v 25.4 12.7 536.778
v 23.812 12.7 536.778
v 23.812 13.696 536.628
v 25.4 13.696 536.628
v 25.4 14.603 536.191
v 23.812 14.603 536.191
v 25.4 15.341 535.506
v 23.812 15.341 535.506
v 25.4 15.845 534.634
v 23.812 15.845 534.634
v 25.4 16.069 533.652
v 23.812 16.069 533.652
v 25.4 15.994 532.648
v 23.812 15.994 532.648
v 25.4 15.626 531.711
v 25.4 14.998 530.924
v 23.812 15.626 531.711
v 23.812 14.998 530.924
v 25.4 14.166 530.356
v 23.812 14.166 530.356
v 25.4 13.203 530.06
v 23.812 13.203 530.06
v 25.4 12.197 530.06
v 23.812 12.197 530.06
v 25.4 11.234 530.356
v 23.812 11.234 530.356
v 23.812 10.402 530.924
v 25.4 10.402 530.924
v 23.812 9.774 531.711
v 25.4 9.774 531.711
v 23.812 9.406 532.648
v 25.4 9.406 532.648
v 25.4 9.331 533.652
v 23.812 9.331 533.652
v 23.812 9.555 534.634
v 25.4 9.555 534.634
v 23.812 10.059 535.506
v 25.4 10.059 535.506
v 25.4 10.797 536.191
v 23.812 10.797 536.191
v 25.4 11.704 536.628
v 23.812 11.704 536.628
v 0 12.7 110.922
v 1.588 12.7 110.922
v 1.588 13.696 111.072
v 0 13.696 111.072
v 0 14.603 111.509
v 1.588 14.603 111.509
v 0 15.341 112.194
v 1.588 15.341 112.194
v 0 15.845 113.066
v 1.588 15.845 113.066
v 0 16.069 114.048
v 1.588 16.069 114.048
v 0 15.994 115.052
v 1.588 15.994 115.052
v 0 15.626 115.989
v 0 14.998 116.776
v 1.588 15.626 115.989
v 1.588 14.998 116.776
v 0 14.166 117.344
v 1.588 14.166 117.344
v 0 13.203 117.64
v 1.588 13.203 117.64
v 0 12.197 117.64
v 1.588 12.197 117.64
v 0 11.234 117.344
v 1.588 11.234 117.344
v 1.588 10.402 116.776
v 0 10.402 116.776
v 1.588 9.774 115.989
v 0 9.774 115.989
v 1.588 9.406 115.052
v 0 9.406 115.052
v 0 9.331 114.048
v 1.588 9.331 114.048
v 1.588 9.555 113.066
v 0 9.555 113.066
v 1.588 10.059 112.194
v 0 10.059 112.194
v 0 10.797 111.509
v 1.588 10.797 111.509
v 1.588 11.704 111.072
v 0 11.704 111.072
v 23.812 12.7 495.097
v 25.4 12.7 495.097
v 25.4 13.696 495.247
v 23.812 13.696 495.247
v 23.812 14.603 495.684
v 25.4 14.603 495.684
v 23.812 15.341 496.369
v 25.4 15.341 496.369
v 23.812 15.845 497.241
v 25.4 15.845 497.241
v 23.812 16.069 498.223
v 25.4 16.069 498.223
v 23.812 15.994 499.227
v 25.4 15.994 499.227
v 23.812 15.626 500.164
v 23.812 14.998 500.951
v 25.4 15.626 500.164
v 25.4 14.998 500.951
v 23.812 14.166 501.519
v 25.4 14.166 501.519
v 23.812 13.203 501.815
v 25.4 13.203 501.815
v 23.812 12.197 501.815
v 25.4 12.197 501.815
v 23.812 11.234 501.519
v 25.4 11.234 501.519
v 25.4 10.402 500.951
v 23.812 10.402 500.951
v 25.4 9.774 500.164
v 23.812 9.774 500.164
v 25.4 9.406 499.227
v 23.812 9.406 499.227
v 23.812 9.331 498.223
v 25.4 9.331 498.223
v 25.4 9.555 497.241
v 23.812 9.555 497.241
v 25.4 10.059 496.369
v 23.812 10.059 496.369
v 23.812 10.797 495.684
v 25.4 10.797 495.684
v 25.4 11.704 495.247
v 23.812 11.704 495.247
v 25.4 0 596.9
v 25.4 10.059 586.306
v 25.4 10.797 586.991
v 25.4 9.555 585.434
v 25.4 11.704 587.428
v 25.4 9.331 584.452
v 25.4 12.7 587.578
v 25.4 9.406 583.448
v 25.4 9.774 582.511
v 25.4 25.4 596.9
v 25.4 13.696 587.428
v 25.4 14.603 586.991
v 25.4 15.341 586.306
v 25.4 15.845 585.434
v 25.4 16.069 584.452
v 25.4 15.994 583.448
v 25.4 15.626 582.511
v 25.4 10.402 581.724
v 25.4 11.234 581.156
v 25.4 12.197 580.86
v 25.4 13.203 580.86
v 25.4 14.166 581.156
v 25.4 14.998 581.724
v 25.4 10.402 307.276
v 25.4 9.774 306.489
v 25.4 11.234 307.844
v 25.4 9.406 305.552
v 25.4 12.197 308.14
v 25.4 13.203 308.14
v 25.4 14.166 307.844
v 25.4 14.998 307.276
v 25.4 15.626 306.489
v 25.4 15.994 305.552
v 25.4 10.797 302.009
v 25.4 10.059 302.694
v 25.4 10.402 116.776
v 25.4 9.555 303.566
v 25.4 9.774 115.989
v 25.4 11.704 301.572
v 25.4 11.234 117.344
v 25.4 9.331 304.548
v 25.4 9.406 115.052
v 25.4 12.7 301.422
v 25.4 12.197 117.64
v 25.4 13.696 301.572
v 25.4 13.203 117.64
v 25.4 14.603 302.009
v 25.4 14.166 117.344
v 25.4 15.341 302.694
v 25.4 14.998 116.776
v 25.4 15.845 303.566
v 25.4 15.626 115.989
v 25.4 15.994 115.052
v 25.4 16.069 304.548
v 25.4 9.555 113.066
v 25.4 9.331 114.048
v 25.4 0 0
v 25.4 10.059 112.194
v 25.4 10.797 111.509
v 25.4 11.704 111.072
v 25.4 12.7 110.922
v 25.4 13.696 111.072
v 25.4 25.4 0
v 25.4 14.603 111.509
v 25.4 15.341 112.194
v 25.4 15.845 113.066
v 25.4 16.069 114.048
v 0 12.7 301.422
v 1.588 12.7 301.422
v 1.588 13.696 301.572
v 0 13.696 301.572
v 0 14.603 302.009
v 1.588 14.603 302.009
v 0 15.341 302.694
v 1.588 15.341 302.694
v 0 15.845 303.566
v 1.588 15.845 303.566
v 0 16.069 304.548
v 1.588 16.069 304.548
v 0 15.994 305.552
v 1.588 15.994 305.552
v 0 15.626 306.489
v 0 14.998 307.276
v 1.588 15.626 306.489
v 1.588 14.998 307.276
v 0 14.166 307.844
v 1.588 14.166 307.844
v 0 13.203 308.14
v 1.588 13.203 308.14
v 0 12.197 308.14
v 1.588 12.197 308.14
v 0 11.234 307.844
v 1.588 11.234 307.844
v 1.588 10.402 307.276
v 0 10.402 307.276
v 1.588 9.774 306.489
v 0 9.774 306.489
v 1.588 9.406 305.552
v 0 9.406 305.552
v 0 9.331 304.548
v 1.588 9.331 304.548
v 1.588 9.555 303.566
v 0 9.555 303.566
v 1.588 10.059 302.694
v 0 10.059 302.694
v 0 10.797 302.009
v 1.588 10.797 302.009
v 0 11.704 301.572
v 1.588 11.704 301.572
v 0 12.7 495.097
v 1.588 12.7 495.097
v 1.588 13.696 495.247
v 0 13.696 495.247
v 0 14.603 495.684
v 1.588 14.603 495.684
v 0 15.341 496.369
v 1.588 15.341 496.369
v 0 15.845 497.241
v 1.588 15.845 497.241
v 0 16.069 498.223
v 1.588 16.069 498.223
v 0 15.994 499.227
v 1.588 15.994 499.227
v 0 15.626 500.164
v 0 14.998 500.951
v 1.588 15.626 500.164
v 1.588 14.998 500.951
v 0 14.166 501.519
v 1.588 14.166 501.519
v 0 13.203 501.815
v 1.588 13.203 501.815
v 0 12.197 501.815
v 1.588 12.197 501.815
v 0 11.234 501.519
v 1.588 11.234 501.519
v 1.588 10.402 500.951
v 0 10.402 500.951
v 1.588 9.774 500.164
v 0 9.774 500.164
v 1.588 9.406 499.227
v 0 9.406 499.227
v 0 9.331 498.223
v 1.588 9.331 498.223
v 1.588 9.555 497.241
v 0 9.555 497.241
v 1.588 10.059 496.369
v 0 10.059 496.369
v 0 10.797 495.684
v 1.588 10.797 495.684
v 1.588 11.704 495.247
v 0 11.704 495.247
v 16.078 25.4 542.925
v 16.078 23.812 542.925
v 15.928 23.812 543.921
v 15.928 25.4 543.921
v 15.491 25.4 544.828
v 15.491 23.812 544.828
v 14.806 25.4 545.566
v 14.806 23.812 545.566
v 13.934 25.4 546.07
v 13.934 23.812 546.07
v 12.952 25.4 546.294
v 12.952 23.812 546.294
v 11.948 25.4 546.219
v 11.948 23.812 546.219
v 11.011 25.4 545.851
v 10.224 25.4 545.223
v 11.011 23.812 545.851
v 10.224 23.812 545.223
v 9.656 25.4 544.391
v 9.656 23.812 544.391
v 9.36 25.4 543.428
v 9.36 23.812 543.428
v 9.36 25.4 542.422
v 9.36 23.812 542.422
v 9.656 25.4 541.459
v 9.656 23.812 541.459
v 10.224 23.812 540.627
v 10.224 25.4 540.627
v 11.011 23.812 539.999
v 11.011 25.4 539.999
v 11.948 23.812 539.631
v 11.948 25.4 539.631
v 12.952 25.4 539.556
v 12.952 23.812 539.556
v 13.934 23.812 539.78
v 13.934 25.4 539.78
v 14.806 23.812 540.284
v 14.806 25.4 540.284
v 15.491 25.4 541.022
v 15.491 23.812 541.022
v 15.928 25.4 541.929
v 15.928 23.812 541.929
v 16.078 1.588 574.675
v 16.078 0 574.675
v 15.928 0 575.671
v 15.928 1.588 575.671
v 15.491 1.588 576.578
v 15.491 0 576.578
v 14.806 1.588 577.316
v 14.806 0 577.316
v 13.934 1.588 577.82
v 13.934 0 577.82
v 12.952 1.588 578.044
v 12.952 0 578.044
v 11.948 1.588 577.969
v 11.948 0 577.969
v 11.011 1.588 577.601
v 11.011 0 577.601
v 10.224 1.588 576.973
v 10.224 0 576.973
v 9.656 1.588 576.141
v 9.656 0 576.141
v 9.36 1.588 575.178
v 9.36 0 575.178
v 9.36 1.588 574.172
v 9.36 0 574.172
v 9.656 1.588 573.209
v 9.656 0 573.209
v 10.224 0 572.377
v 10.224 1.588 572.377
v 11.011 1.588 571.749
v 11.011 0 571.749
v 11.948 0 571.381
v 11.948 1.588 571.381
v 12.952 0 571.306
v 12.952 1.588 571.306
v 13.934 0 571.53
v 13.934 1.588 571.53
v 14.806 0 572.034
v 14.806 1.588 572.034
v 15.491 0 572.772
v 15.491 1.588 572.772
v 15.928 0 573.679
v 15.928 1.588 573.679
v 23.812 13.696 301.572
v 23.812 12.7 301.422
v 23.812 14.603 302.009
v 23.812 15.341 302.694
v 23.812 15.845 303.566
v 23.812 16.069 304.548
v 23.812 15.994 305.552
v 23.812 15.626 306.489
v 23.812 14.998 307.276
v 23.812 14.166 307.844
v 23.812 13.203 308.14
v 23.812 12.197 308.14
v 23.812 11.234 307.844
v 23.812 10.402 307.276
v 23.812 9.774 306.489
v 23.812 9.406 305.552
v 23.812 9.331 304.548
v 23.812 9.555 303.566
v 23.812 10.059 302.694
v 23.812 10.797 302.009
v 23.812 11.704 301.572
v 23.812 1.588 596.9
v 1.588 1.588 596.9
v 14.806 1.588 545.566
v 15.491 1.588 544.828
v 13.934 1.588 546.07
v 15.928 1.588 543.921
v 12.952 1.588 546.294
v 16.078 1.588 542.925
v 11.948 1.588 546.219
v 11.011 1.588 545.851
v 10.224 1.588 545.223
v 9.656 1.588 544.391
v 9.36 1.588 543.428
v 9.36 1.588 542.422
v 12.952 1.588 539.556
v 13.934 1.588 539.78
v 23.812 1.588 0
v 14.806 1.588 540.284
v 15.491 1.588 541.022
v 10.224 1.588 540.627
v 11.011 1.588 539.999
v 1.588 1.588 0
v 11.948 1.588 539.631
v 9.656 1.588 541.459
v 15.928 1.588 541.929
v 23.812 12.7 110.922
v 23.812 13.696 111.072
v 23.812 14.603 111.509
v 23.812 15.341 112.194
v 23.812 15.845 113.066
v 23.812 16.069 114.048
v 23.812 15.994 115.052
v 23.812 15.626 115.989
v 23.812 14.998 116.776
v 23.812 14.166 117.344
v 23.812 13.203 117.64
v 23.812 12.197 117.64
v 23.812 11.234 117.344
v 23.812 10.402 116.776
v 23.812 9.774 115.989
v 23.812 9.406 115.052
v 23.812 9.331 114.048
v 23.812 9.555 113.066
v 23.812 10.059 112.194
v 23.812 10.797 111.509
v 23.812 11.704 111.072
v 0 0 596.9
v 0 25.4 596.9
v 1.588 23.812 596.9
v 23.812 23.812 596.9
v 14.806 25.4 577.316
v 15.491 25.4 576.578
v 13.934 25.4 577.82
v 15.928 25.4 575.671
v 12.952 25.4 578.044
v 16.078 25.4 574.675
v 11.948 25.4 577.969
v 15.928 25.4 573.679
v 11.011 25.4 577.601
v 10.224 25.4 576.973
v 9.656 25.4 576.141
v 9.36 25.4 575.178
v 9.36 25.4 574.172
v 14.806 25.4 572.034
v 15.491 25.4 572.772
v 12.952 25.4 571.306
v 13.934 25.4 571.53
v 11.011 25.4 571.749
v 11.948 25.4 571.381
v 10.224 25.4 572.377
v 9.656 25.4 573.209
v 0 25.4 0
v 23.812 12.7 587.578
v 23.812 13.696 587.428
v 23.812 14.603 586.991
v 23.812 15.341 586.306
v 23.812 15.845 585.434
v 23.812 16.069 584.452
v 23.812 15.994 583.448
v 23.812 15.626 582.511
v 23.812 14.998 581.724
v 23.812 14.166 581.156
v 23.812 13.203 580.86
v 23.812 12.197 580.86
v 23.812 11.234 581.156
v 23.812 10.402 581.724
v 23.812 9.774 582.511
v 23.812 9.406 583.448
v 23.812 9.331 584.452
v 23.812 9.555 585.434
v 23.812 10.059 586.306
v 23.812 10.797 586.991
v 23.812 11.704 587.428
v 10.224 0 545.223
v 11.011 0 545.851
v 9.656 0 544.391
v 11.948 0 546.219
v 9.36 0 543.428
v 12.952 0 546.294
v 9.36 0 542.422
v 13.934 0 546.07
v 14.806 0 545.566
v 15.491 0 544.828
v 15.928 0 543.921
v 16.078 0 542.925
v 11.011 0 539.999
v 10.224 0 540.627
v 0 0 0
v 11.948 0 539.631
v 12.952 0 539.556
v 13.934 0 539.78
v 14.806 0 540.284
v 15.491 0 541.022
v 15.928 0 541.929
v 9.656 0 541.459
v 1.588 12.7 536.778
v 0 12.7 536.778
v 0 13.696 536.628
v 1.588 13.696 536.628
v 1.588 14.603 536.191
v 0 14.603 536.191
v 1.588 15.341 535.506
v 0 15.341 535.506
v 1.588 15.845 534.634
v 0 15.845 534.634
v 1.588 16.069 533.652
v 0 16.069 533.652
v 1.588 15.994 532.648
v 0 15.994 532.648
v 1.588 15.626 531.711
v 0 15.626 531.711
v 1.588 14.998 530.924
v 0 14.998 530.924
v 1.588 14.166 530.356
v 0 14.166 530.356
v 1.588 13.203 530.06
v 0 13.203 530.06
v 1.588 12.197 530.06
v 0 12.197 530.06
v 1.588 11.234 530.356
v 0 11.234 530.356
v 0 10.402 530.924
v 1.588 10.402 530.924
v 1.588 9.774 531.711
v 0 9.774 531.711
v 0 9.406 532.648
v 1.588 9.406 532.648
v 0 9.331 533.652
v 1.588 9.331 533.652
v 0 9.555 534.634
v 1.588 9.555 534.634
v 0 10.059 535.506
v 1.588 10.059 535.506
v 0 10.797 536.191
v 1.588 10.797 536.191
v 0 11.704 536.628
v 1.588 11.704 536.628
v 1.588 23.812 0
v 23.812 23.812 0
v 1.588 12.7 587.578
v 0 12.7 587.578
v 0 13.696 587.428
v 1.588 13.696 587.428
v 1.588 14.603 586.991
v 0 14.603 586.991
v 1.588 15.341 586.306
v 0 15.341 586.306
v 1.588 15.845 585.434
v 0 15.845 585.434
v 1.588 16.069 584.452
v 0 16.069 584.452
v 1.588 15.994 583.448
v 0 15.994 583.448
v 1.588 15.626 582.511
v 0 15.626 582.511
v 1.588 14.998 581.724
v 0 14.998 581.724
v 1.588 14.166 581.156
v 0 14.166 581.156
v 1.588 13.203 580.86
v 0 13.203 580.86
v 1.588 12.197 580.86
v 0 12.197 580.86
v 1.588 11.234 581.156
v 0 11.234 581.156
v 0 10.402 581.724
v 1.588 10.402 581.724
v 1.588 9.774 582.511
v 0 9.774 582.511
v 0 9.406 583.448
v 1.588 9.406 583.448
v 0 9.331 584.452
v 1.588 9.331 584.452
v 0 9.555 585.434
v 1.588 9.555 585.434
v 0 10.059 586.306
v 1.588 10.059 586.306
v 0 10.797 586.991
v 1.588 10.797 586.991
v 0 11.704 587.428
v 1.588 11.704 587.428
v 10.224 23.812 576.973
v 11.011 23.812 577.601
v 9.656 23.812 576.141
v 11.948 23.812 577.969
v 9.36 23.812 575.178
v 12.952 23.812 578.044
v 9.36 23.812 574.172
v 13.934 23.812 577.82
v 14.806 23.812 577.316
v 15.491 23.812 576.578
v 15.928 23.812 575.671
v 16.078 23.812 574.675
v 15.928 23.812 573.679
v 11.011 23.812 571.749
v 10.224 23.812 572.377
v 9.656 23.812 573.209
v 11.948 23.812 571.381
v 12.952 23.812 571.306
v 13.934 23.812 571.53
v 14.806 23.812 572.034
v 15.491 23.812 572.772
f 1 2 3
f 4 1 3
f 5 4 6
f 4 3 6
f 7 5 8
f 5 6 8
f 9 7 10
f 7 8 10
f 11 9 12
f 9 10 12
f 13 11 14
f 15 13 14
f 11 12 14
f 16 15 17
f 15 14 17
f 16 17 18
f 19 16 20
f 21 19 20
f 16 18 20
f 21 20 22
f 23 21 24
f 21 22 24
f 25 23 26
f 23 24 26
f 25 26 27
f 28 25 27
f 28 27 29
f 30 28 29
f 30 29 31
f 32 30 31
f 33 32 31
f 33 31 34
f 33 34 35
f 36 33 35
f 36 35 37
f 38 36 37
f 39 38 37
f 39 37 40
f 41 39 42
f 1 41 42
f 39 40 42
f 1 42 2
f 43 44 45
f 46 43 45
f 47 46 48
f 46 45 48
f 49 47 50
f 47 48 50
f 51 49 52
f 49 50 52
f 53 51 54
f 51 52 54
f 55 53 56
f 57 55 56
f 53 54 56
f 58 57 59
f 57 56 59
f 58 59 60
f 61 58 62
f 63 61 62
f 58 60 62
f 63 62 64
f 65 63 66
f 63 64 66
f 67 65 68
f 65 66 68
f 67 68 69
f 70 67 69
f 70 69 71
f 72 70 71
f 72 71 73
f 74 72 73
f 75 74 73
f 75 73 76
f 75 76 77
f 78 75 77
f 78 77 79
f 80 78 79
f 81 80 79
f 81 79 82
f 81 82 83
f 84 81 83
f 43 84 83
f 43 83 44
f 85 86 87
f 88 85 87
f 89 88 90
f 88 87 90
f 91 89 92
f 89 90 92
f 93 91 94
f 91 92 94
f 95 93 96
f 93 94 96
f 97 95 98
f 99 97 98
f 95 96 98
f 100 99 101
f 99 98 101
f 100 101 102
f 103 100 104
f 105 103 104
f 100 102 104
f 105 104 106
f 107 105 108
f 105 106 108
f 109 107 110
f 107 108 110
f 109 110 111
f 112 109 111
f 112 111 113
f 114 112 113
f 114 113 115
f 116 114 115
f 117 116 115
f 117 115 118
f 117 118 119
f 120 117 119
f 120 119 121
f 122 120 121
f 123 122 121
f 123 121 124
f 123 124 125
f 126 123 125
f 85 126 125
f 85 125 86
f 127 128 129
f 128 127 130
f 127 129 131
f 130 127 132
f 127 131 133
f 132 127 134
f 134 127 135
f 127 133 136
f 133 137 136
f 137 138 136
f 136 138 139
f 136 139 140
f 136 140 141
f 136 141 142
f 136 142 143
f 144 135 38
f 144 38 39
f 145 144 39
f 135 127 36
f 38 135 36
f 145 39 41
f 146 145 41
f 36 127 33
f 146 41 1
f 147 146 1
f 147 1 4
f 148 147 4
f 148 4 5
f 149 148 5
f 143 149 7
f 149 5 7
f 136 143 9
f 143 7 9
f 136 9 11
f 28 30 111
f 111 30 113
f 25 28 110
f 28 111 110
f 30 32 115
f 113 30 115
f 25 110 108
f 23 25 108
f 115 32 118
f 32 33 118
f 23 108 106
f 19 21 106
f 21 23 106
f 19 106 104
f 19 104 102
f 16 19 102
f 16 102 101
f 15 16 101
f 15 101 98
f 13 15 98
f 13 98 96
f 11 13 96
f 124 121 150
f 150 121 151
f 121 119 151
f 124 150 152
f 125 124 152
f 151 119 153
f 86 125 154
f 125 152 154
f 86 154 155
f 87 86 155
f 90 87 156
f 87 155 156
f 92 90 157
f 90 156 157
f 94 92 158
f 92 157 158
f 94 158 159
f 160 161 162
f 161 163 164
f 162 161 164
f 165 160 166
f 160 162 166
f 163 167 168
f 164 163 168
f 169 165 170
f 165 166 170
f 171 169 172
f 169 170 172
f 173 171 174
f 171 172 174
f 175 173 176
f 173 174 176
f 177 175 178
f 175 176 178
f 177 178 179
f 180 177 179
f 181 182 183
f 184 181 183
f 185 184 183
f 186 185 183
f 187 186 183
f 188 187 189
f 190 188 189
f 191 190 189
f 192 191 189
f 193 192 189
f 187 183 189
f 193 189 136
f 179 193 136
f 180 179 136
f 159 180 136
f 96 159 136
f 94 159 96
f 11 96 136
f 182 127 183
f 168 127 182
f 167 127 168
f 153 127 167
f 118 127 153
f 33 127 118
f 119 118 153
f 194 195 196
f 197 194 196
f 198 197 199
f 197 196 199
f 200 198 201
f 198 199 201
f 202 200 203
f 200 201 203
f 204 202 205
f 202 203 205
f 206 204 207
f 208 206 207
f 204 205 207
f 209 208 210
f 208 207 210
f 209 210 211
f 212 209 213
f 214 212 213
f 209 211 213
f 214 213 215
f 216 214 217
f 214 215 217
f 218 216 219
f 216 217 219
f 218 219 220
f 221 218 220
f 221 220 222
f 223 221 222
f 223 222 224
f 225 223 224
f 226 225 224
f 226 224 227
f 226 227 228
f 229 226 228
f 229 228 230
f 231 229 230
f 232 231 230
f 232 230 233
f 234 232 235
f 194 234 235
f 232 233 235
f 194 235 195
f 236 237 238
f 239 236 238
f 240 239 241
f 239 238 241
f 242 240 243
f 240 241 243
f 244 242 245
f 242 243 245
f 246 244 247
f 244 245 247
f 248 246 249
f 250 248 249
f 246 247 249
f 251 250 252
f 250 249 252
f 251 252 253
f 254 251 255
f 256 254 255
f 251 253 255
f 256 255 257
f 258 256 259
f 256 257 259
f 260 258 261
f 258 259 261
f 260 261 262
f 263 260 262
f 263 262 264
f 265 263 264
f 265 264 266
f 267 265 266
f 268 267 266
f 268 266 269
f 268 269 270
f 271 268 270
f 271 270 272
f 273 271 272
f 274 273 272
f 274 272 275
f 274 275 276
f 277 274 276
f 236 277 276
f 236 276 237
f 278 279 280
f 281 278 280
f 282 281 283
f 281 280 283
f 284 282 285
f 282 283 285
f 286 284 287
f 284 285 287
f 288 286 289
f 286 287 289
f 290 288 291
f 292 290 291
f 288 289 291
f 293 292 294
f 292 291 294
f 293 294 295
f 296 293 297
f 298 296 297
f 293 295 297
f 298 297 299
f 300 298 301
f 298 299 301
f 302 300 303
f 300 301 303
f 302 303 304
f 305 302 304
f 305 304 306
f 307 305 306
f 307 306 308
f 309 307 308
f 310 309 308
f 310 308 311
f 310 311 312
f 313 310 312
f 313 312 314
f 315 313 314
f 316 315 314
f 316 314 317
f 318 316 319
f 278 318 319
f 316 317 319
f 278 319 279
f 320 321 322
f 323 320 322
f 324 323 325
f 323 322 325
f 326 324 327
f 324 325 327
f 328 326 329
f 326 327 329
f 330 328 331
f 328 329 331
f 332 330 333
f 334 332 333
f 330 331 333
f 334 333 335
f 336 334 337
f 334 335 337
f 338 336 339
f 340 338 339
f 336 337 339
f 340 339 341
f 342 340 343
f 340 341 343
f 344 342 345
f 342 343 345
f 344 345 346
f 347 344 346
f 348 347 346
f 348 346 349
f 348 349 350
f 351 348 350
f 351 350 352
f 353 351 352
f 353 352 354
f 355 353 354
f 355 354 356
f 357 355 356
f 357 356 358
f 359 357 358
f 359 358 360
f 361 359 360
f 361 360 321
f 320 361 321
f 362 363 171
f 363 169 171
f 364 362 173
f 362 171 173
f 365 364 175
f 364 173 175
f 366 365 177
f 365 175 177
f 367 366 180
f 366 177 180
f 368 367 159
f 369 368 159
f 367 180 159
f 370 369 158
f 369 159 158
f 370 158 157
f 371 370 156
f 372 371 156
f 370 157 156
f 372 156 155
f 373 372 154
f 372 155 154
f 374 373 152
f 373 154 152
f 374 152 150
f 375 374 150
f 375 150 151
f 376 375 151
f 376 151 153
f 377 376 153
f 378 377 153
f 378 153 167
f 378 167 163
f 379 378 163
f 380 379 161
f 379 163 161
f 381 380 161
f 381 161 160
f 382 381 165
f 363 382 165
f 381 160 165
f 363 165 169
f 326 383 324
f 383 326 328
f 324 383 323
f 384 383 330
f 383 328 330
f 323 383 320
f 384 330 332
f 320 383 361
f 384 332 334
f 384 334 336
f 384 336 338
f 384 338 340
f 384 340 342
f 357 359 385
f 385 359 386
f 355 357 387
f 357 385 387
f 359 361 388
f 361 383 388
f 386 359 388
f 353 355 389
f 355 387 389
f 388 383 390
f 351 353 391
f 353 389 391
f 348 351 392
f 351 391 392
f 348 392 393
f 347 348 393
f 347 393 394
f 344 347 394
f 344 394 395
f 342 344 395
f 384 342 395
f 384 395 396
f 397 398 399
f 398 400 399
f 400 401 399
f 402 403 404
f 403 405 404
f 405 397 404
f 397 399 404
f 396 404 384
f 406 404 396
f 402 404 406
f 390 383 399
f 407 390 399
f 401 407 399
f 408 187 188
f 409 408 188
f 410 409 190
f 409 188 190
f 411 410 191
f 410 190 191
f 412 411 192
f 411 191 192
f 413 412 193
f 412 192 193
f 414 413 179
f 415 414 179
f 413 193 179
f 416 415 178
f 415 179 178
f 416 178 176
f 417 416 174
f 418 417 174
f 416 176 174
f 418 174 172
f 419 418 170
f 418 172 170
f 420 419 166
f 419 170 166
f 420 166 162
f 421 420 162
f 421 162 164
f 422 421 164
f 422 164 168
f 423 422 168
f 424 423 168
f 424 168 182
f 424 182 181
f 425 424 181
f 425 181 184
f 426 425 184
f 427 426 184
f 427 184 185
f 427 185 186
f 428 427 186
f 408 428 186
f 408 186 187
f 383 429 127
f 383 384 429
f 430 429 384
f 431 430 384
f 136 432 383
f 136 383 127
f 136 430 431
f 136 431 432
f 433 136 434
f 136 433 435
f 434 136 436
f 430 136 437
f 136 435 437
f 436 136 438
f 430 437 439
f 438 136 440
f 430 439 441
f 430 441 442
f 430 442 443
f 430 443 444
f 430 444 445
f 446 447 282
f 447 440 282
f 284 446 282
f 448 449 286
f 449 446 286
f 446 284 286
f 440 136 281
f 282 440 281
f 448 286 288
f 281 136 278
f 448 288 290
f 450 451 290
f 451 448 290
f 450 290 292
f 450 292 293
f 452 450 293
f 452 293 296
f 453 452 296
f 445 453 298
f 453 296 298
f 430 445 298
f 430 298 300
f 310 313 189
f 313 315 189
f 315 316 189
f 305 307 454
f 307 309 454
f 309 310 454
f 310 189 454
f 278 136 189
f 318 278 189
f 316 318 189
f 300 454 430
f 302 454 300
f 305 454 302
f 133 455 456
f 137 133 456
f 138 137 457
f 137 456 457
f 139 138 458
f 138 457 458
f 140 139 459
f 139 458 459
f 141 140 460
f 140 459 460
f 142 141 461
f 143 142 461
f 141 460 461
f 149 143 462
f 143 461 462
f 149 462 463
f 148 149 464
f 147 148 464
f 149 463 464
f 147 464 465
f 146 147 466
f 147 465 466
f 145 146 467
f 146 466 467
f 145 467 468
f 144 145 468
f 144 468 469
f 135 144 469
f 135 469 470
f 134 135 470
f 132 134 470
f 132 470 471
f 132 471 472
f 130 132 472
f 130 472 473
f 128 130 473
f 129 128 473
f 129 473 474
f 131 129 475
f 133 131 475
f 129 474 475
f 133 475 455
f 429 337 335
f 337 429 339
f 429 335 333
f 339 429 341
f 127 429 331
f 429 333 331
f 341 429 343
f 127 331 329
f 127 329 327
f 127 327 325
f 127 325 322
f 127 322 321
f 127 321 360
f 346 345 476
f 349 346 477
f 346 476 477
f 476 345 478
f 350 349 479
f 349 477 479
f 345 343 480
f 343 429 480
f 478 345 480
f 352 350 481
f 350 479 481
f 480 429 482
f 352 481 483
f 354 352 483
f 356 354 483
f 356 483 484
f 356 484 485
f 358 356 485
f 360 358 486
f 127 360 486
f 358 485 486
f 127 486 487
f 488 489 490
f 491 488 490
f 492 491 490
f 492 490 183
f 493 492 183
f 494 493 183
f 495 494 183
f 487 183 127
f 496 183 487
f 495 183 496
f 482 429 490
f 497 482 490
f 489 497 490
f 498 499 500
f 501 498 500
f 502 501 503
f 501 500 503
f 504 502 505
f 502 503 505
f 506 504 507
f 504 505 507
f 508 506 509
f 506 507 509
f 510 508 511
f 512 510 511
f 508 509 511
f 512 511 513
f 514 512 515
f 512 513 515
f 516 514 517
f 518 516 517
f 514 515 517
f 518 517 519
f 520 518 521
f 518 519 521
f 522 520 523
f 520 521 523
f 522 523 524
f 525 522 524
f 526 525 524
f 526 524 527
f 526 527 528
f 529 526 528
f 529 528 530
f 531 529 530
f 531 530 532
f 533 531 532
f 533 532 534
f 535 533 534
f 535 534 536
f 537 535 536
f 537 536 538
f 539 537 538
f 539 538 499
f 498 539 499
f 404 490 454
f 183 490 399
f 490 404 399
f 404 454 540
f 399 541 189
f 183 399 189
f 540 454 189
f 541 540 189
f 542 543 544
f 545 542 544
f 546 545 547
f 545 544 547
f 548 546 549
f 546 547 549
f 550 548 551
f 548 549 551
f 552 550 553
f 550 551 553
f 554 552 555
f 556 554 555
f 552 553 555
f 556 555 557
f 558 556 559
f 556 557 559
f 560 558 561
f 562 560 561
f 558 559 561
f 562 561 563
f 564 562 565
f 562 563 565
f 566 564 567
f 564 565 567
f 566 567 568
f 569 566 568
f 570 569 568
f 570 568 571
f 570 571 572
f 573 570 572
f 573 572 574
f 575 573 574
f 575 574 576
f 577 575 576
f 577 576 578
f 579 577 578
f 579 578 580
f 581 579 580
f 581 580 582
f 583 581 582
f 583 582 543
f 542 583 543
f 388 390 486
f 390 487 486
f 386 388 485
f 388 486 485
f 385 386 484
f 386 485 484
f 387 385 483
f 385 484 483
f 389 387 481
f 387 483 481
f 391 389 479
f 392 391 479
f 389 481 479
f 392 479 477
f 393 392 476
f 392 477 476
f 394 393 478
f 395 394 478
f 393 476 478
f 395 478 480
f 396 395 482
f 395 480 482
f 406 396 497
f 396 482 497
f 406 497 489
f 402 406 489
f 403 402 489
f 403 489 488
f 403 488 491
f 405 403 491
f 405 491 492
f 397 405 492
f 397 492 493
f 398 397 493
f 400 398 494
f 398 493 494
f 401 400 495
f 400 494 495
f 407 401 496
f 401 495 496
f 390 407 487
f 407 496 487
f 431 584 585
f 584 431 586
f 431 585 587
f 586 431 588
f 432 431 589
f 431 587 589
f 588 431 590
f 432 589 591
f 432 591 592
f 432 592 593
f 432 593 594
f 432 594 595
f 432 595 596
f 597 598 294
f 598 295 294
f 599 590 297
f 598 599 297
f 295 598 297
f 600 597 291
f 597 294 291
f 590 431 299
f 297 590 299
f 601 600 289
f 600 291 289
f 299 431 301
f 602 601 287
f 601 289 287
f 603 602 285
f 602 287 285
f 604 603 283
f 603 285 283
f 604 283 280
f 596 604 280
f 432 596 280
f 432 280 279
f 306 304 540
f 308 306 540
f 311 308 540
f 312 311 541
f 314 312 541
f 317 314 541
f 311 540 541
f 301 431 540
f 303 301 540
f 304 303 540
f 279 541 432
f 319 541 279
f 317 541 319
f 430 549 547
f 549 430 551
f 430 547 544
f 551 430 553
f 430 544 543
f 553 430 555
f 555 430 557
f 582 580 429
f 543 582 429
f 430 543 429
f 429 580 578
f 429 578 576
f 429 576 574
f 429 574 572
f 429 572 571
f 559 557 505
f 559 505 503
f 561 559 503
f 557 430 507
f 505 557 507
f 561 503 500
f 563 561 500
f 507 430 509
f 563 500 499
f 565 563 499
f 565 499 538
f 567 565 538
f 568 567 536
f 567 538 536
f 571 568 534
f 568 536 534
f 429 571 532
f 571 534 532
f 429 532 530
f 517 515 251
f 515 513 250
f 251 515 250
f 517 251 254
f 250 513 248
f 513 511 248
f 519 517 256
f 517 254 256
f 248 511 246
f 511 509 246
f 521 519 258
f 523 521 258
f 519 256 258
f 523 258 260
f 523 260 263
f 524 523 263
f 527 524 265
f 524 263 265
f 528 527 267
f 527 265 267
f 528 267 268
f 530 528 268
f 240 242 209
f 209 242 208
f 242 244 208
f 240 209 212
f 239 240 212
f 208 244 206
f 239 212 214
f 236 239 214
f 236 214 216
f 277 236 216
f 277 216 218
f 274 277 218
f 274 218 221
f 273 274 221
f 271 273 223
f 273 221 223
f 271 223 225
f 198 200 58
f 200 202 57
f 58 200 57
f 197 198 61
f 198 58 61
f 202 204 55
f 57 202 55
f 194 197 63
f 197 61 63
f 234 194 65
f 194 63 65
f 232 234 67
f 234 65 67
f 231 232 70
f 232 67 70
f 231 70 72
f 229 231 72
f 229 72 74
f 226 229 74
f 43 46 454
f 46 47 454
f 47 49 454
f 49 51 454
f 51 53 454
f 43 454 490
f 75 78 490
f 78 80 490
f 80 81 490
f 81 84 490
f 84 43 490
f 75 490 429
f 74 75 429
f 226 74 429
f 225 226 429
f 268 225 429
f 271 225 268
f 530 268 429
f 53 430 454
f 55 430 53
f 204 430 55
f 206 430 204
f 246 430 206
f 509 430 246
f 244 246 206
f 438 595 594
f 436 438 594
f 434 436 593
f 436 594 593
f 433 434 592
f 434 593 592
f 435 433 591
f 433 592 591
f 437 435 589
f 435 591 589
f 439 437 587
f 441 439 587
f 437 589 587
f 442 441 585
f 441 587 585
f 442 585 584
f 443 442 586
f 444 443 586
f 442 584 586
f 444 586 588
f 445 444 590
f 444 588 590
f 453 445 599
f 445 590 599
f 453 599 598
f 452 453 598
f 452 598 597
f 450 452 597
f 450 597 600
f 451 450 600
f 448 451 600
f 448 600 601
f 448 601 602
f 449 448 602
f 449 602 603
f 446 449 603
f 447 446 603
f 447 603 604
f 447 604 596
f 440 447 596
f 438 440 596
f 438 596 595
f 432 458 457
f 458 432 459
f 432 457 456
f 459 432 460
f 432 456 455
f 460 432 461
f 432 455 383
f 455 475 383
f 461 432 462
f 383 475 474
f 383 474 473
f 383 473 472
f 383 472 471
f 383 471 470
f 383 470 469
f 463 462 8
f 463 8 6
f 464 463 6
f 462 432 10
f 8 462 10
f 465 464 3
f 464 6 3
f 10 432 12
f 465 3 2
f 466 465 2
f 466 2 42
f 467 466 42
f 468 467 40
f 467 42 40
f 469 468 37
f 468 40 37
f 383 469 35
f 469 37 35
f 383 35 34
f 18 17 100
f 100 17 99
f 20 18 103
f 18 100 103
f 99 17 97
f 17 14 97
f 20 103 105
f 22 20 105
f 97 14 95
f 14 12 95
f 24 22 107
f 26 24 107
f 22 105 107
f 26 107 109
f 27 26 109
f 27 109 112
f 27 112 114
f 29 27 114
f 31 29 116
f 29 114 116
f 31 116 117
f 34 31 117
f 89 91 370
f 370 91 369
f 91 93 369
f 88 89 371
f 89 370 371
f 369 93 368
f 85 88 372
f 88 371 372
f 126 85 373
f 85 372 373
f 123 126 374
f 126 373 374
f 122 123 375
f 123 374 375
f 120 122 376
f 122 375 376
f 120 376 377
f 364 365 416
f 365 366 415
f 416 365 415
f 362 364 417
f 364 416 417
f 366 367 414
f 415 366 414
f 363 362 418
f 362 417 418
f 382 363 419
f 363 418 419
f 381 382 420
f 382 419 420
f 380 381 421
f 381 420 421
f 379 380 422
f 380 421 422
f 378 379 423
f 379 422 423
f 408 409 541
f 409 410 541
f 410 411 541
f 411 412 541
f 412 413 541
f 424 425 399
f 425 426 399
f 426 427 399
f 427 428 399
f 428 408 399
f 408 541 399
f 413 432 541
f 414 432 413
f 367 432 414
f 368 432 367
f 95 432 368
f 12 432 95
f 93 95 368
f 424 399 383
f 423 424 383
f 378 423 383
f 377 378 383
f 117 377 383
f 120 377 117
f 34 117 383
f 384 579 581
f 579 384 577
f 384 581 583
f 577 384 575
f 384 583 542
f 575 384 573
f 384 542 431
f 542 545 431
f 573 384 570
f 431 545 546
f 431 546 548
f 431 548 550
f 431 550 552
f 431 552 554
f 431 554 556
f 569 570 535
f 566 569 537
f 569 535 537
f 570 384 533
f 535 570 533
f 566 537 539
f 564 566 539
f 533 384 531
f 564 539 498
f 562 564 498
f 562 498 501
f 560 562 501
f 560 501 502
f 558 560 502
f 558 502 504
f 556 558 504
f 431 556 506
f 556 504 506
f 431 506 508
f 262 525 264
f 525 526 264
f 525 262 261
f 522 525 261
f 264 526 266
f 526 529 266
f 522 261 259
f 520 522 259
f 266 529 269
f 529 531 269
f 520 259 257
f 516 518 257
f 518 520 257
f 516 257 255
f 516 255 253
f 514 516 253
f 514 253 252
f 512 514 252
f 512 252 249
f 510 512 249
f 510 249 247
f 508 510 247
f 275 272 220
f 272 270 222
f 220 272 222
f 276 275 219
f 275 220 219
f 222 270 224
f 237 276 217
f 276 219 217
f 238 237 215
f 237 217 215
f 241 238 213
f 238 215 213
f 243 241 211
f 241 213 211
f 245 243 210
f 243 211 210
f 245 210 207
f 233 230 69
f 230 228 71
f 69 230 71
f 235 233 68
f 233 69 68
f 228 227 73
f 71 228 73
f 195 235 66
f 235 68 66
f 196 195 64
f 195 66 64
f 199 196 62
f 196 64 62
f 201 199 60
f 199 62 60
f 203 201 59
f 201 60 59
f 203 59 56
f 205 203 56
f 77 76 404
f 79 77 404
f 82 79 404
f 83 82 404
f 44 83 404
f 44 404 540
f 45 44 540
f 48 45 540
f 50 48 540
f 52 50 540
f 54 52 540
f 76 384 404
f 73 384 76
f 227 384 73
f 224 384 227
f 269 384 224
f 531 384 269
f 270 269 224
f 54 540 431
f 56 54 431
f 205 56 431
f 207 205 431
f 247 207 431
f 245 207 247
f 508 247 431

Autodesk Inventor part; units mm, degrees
ref_plane "YZ Plane" through (0, 0, 0) normal (1, 0, 0) x (0, 1, 0)
ref_plane "XZ Plane" through (0, 0, 0) normal (0, 1, 0) x (-1, 0, 0)
ref_plane "XY Plane" through (0, 0, 0) normal (0, 0, 1) x (1, 0, 0)
sketch "Sketch1" plane through (0, 0, 0) normal (0, 0, 1) x (1, 0, 0)
  line L0 (0, 0) -> (25.4, 0)
  line L1 (25.4, 0) -> (25.4, 25.4)
  line L2 (25.4, 25.4) -> (0, 25.4)
  line L3 (0, 25.4) -> (0, 0)
  line L4 (1.5875, 23.8125) -> (23.8125, 23.8125)
  line L5 (23.8125, 23.8125) -> (23.8125, 1.5875)
  line L6 (23.8125, 1.5875) -> (1.5875, 1.5875)
  line L7 (1.5875, 1.5875) -> (1.5875, 23.8125)
  dimension "d0" = 25.4
  dimension "d2" = 25.4
  dimension "d3" = 1.5875
extrude "Extrusion1" add sketch "Sketch1" along normal blind 596.9
sketch "Sketch3" plane through (0, 0, 0) normal (0, -1, 0) x (1, 0, 0)
  circle A0 centre (12.7, 574.675) radius 3.3782 projected
  circle A1 centre (12.7, 542.925) radius 3.3782 projected
extrude "Extrusion3" cut sketch "Sketch3" against normal blind 25.4
sketch "Sketch4" plane through (0, 0, 0) normal (-1, 0, 0) x (0, 0, 1)
  circle A0 centre (533.4, 12.7) radius 3.3782 projected
  circle A1 centre (584.2, 12.7) radius 3.3782 projected
extrude "Extrusion4" cut sketch "Sketch4" against normal blind 25.4
sketch "Sketch5" plane through (25.4, 0, 0) normal (1, 0, 0) x (0, 0, -1)
  line L0 (0, 25.4) -> (-596.9, 25.4) projected
  line L1 (-596.9, 0) -> (-596.9, 25.4) projected
  circle A0 centre (-498.475, 12.7) radius 3.3782
  circle A1 centre (-304.8, 12.7) radius 3.3782
  circle A2 centre (-114.3, 12.7) radius 3.3782
  dimension "d12" = 6.7564
  dimension "d13" = 6.7564
  dimension "d14" = 98.425
  dimension "d15" = 292.1
  dimension "d16" = 6.7564
  dimension "d17" = 482.6
  dimension "d18" = 12.7
  dimension "d19" = 12.7
  dimension "d20" = 12.7
extrude "Extrusion5" cut sketch "Sketch5" against normal blind 25.4
properties part number "Inner Mount" material "Aluminum 6061"
